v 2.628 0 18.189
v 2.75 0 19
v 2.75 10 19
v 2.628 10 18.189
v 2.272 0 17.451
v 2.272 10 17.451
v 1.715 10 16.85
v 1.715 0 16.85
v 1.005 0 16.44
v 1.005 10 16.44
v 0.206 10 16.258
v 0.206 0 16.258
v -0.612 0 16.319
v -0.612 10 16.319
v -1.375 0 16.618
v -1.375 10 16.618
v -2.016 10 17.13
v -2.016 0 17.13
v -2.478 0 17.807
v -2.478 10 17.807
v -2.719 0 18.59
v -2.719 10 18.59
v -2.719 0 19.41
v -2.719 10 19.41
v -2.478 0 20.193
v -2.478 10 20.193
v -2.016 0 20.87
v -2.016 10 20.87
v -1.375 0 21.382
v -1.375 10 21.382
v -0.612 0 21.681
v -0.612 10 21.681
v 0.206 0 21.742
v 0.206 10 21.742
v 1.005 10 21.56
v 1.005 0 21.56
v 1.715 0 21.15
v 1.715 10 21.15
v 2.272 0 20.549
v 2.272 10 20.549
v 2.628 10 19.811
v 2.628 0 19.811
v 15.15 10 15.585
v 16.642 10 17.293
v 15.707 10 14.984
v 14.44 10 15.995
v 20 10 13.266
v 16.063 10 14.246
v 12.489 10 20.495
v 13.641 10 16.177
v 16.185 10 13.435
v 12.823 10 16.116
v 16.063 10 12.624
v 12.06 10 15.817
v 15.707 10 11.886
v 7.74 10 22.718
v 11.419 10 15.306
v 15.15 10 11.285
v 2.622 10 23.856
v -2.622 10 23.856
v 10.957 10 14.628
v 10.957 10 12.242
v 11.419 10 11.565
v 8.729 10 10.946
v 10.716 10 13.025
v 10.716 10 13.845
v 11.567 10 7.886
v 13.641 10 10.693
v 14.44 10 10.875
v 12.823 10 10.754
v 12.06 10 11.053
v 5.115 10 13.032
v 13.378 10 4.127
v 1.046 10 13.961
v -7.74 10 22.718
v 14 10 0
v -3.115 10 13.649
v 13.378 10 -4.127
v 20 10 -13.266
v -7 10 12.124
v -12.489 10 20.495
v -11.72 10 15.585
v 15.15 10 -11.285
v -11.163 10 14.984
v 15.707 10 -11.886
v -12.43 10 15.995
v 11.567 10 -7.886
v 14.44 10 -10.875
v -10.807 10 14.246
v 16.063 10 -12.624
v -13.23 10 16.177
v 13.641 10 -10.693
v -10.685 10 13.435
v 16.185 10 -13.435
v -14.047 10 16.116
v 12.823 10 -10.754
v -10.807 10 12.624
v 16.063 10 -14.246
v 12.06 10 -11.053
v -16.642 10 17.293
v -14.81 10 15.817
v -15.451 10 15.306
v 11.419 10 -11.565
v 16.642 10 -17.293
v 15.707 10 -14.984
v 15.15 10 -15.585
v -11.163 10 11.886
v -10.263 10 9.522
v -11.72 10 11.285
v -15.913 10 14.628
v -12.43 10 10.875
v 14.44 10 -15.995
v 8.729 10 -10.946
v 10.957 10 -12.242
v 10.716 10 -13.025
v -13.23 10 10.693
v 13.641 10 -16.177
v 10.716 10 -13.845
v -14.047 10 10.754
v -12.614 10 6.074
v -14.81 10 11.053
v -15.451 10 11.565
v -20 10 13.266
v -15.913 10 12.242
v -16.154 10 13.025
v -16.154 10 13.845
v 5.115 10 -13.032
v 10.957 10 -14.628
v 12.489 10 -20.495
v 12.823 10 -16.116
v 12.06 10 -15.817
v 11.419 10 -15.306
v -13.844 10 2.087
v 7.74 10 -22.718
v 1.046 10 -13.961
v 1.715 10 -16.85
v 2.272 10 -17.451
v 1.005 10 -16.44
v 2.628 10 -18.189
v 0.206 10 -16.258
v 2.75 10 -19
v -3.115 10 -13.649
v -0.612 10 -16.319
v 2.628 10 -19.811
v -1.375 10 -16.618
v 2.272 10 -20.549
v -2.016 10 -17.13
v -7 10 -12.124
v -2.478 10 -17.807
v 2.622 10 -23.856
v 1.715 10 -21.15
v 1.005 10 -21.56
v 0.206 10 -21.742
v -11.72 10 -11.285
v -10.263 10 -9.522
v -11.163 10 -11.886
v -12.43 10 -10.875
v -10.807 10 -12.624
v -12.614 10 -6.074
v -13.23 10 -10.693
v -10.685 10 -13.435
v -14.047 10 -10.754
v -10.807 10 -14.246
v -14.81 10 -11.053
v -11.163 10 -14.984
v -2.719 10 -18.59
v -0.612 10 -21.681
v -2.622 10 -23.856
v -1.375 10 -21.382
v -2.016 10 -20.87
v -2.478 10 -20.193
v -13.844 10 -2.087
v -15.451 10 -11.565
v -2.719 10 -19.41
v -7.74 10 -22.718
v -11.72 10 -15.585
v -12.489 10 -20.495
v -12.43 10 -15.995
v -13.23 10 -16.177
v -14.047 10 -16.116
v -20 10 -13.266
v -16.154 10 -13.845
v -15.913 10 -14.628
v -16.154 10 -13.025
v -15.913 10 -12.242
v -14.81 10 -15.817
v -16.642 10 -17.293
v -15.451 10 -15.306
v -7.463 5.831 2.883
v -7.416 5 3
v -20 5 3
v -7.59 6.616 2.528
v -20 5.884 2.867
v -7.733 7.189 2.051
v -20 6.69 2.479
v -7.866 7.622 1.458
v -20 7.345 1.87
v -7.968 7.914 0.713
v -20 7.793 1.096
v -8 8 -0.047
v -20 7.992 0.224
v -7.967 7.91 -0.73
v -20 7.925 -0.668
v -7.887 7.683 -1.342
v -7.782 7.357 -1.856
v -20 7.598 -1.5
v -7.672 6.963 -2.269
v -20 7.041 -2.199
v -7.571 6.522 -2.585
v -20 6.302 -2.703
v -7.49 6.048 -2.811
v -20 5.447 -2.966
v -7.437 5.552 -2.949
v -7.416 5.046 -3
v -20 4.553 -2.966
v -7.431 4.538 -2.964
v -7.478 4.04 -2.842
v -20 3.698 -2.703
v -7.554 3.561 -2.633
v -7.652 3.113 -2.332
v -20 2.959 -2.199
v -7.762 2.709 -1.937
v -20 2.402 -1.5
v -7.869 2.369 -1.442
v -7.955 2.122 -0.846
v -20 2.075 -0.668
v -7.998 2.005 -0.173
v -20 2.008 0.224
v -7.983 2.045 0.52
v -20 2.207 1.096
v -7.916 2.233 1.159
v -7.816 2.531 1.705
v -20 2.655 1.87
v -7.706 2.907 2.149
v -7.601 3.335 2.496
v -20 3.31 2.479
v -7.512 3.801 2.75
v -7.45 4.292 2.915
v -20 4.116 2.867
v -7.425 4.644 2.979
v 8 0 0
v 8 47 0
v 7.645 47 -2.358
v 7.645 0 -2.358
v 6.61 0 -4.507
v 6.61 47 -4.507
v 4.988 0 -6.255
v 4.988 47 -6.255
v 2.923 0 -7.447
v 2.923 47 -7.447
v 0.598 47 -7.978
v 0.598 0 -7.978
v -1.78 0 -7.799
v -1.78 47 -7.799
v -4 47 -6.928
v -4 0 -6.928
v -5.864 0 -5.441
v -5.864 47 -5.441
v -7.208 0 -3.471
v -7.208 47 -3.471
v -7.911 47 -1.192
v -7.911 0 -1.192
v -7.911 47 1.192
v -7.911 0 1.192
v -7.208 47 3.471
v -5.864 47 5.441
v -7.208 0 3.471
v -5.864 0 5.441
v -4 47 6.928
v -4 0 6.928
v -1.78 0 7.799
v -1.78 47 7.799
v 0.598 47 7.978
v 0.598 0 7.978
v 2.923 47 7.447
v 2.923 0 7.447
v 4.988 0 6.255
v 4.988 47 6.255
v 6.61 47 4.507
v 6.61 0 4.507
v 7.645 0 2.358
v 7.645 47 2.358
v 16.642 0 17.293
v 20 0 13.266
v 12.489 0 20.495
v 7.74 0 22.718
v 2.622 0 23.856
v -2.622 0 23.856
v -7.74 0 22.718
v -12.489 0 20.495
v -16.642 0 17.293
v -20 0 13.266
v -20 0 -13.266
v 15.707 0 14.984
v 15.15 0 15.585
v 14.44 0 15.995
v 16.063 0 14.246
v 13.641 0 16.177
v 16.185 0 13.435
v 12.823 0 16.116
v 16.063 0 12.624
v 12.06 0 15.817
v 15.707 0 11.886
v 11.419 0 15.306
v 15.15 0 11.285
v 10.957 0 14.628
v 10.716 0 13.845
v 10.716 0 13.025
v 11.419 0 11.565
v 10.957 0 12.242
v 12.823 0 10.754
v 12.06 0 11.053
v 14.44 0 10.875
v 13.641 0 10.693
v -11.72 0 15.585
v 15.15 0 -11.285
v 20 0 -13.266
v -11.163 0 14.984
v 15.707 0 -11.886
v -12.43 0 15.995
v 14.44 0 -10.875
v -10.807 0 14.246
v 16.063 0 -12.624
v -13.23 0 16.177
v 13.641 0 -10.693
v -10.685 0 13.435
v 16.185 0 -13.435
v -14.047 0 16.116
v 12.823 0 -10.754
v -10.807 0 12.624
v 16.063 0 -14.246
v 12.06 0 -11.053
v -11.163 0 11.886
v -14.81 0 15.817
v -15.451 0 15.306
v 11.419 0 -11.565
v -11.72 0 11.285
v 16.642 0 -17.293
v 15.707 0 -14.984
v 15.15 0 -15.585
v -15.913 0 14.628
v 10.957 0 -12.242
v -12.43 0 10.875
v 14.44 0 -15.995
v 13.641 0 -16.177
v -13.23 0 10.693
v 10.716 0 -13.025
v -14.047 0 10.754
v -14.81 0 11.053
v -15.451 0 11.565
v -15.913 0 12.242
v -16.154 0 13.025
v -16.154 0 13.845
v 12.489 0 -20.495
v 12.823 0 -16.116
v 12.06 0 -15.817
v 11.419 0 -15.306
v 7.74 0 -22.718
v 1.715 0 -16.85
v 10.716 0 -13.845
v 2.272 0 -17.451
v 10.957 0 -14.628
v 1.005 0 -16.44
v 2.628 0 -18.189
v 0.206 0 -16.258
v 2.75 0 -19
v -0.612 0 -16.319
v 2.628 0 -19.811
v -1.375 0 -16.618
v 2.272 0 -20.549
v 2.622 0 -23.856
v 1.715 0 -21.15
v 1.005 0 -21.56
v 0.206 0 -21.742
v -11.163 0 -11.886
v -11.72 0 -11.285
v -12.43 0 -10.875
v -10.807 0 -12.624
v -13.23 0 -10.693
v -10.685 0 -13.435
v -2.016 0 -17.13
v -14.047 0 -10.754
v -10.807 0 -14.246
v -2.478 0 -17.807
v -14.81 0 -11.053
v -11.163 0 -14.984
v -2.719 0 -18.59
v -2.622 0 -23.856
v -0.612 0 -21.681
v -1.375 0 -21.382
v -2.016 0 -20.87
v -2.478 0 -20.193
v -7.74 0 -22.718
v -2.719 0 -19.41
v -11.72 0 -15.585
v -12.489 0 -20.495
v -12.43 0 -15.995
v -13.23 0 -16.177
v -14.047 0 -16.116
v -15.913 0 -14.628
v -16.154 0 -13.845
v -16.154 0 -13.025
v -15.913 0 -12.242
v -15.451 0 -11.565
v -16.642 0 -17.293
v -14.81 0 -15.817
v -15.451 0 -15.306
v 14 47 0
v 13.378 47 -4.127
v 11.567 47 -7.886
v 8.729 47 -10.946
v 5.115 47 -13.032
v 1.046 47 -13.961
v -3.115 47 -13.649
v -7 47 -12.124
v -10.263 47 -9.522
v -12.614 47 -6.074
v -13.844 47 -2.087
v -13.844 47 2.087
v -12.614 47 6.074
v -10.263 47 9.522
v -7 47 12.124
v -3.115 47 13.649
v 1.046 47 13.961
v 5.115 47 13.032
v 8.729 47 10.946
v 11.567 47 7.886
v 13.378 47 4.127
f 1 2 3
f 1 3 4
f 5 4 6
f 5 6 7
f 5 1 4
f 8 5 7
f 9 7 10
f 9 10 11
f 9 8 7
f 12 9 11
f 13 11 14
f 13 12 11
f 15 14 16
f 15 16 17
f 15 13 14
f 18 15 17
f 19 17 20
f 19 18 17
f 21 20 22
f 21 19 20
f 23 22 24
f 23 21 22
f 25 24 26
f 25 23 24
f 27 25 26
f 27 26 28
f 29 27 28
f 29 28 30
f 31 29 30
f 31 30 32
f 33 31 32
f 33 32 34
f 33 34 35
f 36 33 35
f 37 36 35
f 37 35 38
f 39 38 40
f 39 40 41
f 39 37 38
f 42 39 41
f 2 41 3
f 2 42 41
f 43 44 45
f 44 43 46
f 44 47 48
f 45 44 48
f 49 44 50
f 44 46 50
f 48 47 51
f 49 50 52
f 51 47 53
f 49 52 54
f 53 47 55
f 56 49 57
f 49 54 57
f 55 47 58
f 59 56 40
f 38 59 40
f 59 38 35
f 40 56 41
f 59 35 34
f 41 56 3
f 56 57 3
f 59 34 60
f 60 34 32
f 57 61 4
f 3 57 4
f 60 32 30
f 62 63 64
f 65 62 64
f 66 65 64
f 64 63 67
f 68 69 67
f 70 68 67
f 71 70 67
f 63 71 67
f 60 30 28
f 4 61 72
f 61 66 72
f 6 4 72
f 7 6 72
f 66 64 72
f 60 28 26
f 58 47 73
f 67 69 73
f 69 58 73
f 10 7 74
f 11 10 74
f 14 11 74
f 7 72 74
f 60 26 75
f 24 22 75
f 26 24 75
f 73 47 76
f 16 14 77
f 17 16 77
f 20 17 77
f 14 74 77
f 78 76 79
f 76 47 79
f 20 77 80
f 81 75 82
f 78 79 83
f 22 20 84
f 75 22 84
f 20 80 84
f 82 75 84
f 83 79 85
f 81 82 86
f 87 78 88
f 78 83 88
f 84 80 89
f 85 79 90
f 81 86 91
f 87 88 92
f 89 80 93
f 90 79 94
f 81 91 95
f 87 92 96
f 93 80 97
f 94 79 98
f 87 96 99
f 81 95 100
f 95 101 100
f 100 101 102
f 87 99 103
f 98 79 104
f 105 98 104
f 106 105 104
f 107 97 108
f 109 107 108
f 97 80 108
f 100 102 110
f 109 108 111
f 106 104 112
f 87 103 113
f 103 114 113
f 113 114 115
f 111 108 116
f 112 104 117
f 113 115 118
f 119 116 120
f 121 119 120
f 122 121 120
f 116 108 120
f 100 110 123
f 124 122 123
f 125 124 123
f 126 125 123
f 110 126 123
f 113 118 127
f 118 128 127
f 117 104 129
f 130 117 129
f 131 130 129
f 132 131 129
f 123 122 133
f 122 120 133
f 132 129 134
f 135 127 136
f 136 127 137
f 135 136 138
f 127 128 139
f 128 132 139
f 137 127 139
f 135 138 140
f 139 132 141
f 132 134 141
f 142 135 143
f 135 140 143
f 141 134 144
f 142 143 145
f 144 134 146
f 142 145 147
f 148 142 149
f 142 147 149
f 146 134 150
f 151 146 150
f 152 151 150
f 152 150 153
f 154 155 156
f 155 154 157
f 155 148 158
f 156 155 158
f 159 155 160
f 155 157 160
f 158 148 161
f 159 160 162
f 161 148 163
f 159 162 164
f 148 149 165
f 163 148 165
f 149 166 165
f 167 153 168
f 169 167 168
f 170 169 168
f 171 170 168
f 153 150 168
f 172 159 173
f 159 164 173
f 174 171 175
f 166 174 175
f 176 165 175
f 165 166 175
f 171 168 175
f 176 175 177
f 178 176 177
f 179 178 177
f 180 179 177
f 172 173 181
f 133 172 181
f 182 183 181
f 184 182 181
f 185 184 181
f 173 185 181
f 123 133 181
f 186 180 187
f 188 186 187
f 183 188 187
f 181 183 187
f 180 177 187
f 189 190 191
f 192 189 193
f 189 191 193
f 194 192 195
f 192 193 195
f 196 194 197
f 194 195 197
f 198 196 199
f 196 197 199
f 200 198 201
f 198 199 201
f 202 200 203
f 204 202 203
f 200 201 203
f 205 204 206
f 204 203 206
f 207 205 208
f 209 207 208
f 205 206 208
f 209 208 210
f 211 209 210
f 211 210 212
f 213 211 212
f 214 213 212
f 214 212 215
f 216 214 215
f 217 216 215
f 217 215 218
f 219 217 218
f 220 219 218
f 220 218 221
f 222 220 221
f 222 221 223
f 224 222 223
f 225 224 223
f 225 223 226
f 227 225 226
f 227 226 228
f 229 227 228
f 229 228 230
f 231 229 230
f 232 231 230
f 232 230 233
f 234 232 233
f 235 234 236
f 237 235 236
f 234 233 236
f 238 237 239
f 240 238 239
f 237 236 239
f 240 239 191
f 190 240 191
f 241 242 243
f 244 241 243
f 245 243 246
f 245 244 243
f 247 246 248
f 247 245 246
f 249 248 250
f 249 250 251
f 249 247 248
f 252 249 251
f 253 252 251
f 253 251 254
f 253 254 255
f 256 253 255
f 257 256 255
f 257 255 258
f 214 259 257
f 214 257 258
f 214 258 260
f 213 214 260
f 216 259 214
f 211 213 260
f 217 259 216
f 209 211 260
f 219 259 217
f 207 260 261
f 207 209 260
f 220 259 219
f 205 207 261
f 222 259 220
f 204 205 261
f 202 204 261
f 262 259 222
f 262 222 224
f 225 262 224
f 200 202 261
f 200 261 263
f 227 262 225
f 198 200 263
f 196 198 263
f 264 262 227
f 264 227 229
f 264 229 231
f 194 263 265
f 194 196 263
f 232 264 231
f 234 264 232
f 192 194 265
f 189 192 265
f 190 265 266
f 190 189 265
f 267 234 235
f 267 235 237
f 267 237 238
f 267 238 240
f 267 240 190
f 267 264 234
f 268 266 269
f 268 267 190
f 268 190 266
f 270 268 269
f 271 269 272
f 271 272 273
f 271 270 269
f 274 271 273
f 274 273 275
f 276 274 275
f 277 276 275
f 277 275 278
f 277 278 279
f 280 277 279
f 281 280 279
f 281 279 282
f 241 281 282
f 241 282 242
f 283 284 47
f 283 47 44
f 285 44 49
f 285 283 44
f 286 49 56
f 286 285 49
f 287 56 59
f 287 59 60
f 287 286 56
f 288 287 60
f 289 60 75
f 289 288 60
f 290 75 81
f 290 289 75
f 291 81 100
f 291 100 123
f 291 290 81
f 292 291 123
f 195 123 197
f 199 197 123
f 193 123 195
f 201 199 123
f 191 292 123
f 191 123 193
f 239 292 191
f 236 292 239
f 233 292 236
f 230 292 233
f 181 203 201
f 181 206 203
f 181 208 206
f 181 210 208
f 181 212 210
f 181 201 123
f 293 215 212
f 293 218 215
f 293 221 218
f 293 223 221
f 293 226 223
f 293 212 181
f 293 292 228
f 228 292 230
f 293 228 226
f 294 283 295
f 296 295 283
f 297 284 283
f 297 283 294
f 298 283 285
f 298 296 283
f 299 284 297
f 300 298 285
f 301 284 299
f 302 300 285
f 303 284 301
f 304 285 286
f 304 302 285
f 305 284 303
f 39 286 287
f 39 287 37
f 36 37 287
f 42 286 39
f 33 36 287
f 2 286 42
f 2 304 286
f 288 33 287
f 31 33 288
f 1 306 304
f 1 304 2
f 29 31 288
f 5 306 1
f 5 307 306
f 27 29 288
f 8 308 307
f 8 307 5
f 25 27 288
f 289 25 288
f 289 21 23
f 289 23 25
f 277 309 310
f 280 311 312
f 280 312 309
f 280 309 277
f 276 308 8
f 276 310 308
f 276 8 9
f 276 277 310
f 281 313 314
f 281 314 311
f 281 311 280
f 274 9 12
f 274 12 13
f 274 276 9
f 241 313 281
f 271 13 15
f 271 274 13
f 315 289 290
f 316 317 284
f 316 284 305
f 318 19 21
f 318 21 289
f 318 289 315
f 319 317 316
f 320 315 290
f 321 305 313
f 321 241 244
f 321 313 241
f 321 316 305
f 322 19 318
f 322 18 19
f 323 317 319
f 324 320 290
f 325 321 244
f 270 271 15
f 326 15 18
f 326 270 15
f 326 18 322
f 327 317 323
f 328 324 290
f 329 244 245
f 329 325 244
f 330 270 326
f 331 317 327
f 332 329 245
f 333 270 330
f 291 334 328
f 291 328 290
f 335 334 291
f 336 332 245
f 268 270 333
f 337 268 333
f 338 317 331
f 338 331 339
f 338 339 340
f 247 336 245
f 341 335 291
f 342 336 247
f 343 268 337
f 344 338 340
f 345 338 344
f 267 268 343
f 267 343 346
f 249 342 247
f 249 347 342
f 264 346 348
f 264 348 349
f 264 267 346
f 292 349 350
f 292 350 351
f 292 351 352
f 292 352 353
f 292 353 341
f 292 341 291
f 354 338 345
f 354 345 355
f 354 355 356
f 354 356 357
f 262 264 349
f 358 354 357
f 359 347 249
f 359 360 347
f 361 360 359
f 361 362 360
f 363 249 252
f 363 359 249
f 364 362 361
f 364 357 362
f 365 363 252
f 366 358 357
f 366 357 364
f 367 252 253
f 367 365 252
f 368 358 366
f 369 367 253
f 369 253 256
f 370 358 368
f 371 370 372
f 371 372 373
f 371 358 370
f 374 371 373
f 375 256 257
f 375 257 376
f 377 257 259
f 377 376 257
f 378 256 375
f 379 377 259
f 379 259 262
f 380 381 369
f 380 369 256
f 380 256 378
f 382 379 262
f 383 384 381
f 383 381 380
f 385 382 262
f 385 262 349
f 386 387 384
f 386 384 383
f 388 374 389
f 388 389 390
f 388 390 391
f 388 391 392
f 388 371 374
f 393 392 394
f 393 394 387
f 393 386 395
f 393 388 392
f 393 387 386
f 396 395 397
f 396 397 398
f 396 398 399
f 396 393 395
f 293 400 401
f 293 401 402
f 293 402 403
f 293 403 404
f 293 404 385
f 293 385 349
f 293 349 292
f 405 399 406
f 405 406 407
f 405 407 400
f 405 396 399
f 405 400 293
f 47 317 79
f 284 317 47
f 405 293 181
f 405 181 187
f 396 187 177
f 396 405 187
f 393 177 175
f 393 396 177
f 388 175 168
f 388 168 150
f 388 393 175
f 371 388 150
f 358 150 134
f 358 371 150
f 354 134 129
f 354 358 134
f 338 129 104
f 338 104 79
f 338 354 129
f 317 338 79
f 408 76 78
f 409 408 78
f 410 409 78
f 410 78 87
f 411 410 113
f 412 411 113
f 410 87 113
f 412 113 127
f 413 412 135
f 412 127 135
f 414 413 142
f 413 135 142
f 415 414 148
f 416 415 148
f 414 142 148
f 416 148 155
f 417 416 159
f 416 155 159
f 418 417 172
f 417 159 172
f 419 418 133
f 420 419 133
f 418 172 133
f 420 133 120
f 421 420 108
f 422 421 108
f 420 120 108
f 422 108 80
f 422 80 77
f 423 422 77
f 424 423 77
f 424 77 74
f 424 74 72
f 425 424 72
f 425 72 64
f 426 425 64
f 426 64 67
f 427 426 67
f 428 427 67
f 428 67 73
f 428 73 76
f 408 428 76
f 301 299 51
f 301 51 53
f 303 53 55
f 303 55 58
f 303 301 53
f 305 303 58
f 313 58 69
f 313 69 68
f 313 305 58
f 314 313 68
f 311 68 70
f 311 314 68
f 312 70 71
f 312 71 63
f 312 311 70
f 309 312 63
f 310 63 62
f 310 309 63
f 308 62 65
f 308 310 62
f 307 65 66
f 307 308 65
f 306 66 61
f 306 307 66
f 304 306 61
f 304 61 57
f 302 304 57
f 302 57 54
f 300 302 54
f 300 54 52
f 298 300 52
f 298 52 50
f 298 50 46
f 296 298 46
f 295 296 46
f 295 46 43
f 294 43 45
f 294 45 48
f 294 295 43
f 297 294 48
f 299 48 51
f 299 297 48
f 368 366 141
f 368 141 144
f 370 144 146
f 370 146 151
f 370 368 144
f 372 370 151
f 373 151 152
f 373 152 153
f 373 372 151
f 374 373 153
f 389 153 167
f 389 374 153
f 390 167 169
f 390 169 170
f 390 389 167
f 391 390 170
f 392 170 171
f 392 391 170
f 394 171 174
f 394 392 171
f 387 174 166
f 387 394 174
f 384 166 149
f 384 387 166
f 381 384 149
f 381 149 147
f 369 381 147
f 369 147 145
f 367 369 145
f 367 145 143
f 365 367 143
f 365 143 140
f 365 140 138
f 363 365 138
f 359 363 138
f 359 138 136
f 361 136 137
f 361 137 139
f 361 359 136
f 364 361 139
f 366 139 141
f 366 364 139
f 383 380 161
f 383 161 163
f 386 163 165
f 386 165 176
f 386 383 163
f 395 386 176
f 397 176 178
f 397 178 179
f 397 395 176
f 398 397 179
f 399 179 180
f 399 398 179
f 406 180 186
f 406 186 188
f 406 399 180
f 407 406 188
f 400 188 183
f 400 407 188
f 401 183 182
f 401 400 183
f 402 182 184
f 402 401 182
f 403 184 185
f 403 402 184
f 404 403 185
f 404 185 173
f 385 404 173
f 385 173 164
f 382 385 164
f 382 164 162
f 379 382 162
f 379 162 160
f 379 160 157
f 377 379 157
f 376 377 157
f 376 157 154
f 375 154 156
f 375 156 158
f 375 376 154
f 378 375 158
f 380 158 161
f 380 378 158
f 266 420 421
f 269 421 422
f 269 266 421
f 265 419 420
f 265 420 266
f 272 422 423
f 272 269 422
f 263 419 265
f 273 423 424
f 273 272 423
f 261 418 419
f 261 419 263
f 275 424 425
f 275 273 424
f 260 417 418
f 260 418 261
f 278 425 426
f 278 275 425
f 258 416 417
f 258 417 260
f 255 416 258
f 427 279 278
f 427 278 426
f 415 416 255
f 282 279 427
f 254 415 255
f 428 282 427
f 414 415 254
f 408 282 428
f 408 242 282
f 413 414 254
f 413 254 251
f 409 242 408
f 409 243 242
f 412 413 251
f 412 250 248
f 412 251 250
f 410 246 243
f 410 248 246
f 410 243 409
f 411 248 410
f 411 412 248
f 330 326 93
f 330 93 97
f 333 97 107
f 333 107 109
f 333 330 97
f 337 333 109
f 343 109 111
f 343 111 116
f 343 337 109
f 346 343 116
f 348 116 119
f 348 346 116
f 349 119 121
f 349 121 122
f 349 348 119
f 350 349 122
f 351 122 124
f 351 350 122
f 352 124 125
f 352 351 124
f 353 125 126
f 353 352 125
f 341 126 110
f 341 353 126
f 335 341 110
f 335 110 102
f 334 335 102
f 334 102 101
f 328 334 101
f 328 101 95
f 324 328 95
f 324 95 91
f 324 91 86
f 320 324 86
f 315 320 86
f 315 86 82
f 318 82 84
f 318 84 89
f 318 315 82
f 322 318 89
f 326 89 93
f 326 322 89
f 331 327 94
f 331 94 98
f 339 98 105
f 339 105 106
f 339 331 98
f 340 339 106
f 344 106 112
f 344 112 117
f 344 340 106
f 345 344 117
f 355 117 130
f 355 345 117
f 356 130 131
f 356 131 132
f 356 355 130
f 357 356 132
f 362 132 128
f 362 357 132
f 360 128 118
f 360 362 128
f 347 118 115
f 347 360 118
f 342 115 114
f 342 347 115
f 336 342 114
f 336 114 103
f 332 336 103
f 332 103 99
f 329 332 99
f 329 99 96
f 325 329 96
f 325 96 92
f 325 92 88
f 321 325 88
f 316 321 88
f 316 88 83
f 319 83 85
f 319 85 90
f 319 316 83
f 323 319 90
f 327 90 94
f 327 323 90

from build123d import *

# Parameters (mm, degrees)
SKETCH_1_R          = 2.75
SKETCH_1_R_2        = 14
EXTRUDE_1_DEPTH     = 10
SKETCH_1_3_R        = 14
SKETCH_1_3_R_2      = 8
EXTRUDE_2_DEPTH     = 47
SKETCH_2_R          = 3
CUT_EXTRUDE_1_DEPTH = 20


with BuildPart() as part:
    # 草图1 → 凸台-拉伸1 (new body)
    with BuildSketch(Plane(origin=(0, 0, 0), x_dir=(1, 0, 0), z_dir=(0, 1, 0))):
        with BuildLine():
            ThreePointArc((20, 13.266499161), (0, 24), (-20, 13.266499161))
            Line((-20, 13.266499161), (-20, -13.266499161))
            ThreePointArc((-20, -13.266499161), (0, -24), (20, -13.266499161))
            Line((20, -13.266499161), (20, 13.266499161))
        make_face()
        with Locations((-13.435028843, -13.435028843)):
            Circle(SKETCH_1_R, mode=Mode.SUBTRACT)
        with Locations((0, -19)):
            Circle(SKETCH_1_R, mode=Mode.SUBTRACT)
        with Locations((13.435028843, -13.435028843)):
            Circle(SKETCH_1_R, mode=Mode.SUBTRACT)
        Circle(SKETCH_1_R_2, mode=Mode.SUBTRACT)
        with Locations((-13.435028843, 13.435028843)):
            Circle(SKETCH_1_R, mode=Mode.SUBTRACT)
        with Locations((0, 19)):
            Circle(SKETCH_1_R, mode=Mode.SUBTRACT)
        with Locations((13.435028843, 13.435028843)):
            Circle(SKETCH_1_R, mode=Mode.SUBTRACT)
    extrude(amount=EXTRUDE_1_DEPTH)

    # 草图1<3> → 凸台-拉伸2 (add)
    with BuildSketch(Plane(origin=(0, 0, 0), x_dir=(1, 0, 0), z_dir=(0, 1, 0))):
        Circle(SKETCH_1_3_R)
        Circle(SKETCH_1_3_R_2, mode=Mode.SUBTRACT)
    extrude(amount=EXTRUDE_2_DEPTH)

    # 草图2 → 切除-拉伸1 (cut)
    with BuildSketch(Plane.ZY.offset(20)):
        with Locations((0, 5)):
            Circle(SKETCH_2_R)
    extrude(amount=-CUT_EXTRUDE_1_DEPTH, mode=Mode.SUBTRACT)


solid = part.part
